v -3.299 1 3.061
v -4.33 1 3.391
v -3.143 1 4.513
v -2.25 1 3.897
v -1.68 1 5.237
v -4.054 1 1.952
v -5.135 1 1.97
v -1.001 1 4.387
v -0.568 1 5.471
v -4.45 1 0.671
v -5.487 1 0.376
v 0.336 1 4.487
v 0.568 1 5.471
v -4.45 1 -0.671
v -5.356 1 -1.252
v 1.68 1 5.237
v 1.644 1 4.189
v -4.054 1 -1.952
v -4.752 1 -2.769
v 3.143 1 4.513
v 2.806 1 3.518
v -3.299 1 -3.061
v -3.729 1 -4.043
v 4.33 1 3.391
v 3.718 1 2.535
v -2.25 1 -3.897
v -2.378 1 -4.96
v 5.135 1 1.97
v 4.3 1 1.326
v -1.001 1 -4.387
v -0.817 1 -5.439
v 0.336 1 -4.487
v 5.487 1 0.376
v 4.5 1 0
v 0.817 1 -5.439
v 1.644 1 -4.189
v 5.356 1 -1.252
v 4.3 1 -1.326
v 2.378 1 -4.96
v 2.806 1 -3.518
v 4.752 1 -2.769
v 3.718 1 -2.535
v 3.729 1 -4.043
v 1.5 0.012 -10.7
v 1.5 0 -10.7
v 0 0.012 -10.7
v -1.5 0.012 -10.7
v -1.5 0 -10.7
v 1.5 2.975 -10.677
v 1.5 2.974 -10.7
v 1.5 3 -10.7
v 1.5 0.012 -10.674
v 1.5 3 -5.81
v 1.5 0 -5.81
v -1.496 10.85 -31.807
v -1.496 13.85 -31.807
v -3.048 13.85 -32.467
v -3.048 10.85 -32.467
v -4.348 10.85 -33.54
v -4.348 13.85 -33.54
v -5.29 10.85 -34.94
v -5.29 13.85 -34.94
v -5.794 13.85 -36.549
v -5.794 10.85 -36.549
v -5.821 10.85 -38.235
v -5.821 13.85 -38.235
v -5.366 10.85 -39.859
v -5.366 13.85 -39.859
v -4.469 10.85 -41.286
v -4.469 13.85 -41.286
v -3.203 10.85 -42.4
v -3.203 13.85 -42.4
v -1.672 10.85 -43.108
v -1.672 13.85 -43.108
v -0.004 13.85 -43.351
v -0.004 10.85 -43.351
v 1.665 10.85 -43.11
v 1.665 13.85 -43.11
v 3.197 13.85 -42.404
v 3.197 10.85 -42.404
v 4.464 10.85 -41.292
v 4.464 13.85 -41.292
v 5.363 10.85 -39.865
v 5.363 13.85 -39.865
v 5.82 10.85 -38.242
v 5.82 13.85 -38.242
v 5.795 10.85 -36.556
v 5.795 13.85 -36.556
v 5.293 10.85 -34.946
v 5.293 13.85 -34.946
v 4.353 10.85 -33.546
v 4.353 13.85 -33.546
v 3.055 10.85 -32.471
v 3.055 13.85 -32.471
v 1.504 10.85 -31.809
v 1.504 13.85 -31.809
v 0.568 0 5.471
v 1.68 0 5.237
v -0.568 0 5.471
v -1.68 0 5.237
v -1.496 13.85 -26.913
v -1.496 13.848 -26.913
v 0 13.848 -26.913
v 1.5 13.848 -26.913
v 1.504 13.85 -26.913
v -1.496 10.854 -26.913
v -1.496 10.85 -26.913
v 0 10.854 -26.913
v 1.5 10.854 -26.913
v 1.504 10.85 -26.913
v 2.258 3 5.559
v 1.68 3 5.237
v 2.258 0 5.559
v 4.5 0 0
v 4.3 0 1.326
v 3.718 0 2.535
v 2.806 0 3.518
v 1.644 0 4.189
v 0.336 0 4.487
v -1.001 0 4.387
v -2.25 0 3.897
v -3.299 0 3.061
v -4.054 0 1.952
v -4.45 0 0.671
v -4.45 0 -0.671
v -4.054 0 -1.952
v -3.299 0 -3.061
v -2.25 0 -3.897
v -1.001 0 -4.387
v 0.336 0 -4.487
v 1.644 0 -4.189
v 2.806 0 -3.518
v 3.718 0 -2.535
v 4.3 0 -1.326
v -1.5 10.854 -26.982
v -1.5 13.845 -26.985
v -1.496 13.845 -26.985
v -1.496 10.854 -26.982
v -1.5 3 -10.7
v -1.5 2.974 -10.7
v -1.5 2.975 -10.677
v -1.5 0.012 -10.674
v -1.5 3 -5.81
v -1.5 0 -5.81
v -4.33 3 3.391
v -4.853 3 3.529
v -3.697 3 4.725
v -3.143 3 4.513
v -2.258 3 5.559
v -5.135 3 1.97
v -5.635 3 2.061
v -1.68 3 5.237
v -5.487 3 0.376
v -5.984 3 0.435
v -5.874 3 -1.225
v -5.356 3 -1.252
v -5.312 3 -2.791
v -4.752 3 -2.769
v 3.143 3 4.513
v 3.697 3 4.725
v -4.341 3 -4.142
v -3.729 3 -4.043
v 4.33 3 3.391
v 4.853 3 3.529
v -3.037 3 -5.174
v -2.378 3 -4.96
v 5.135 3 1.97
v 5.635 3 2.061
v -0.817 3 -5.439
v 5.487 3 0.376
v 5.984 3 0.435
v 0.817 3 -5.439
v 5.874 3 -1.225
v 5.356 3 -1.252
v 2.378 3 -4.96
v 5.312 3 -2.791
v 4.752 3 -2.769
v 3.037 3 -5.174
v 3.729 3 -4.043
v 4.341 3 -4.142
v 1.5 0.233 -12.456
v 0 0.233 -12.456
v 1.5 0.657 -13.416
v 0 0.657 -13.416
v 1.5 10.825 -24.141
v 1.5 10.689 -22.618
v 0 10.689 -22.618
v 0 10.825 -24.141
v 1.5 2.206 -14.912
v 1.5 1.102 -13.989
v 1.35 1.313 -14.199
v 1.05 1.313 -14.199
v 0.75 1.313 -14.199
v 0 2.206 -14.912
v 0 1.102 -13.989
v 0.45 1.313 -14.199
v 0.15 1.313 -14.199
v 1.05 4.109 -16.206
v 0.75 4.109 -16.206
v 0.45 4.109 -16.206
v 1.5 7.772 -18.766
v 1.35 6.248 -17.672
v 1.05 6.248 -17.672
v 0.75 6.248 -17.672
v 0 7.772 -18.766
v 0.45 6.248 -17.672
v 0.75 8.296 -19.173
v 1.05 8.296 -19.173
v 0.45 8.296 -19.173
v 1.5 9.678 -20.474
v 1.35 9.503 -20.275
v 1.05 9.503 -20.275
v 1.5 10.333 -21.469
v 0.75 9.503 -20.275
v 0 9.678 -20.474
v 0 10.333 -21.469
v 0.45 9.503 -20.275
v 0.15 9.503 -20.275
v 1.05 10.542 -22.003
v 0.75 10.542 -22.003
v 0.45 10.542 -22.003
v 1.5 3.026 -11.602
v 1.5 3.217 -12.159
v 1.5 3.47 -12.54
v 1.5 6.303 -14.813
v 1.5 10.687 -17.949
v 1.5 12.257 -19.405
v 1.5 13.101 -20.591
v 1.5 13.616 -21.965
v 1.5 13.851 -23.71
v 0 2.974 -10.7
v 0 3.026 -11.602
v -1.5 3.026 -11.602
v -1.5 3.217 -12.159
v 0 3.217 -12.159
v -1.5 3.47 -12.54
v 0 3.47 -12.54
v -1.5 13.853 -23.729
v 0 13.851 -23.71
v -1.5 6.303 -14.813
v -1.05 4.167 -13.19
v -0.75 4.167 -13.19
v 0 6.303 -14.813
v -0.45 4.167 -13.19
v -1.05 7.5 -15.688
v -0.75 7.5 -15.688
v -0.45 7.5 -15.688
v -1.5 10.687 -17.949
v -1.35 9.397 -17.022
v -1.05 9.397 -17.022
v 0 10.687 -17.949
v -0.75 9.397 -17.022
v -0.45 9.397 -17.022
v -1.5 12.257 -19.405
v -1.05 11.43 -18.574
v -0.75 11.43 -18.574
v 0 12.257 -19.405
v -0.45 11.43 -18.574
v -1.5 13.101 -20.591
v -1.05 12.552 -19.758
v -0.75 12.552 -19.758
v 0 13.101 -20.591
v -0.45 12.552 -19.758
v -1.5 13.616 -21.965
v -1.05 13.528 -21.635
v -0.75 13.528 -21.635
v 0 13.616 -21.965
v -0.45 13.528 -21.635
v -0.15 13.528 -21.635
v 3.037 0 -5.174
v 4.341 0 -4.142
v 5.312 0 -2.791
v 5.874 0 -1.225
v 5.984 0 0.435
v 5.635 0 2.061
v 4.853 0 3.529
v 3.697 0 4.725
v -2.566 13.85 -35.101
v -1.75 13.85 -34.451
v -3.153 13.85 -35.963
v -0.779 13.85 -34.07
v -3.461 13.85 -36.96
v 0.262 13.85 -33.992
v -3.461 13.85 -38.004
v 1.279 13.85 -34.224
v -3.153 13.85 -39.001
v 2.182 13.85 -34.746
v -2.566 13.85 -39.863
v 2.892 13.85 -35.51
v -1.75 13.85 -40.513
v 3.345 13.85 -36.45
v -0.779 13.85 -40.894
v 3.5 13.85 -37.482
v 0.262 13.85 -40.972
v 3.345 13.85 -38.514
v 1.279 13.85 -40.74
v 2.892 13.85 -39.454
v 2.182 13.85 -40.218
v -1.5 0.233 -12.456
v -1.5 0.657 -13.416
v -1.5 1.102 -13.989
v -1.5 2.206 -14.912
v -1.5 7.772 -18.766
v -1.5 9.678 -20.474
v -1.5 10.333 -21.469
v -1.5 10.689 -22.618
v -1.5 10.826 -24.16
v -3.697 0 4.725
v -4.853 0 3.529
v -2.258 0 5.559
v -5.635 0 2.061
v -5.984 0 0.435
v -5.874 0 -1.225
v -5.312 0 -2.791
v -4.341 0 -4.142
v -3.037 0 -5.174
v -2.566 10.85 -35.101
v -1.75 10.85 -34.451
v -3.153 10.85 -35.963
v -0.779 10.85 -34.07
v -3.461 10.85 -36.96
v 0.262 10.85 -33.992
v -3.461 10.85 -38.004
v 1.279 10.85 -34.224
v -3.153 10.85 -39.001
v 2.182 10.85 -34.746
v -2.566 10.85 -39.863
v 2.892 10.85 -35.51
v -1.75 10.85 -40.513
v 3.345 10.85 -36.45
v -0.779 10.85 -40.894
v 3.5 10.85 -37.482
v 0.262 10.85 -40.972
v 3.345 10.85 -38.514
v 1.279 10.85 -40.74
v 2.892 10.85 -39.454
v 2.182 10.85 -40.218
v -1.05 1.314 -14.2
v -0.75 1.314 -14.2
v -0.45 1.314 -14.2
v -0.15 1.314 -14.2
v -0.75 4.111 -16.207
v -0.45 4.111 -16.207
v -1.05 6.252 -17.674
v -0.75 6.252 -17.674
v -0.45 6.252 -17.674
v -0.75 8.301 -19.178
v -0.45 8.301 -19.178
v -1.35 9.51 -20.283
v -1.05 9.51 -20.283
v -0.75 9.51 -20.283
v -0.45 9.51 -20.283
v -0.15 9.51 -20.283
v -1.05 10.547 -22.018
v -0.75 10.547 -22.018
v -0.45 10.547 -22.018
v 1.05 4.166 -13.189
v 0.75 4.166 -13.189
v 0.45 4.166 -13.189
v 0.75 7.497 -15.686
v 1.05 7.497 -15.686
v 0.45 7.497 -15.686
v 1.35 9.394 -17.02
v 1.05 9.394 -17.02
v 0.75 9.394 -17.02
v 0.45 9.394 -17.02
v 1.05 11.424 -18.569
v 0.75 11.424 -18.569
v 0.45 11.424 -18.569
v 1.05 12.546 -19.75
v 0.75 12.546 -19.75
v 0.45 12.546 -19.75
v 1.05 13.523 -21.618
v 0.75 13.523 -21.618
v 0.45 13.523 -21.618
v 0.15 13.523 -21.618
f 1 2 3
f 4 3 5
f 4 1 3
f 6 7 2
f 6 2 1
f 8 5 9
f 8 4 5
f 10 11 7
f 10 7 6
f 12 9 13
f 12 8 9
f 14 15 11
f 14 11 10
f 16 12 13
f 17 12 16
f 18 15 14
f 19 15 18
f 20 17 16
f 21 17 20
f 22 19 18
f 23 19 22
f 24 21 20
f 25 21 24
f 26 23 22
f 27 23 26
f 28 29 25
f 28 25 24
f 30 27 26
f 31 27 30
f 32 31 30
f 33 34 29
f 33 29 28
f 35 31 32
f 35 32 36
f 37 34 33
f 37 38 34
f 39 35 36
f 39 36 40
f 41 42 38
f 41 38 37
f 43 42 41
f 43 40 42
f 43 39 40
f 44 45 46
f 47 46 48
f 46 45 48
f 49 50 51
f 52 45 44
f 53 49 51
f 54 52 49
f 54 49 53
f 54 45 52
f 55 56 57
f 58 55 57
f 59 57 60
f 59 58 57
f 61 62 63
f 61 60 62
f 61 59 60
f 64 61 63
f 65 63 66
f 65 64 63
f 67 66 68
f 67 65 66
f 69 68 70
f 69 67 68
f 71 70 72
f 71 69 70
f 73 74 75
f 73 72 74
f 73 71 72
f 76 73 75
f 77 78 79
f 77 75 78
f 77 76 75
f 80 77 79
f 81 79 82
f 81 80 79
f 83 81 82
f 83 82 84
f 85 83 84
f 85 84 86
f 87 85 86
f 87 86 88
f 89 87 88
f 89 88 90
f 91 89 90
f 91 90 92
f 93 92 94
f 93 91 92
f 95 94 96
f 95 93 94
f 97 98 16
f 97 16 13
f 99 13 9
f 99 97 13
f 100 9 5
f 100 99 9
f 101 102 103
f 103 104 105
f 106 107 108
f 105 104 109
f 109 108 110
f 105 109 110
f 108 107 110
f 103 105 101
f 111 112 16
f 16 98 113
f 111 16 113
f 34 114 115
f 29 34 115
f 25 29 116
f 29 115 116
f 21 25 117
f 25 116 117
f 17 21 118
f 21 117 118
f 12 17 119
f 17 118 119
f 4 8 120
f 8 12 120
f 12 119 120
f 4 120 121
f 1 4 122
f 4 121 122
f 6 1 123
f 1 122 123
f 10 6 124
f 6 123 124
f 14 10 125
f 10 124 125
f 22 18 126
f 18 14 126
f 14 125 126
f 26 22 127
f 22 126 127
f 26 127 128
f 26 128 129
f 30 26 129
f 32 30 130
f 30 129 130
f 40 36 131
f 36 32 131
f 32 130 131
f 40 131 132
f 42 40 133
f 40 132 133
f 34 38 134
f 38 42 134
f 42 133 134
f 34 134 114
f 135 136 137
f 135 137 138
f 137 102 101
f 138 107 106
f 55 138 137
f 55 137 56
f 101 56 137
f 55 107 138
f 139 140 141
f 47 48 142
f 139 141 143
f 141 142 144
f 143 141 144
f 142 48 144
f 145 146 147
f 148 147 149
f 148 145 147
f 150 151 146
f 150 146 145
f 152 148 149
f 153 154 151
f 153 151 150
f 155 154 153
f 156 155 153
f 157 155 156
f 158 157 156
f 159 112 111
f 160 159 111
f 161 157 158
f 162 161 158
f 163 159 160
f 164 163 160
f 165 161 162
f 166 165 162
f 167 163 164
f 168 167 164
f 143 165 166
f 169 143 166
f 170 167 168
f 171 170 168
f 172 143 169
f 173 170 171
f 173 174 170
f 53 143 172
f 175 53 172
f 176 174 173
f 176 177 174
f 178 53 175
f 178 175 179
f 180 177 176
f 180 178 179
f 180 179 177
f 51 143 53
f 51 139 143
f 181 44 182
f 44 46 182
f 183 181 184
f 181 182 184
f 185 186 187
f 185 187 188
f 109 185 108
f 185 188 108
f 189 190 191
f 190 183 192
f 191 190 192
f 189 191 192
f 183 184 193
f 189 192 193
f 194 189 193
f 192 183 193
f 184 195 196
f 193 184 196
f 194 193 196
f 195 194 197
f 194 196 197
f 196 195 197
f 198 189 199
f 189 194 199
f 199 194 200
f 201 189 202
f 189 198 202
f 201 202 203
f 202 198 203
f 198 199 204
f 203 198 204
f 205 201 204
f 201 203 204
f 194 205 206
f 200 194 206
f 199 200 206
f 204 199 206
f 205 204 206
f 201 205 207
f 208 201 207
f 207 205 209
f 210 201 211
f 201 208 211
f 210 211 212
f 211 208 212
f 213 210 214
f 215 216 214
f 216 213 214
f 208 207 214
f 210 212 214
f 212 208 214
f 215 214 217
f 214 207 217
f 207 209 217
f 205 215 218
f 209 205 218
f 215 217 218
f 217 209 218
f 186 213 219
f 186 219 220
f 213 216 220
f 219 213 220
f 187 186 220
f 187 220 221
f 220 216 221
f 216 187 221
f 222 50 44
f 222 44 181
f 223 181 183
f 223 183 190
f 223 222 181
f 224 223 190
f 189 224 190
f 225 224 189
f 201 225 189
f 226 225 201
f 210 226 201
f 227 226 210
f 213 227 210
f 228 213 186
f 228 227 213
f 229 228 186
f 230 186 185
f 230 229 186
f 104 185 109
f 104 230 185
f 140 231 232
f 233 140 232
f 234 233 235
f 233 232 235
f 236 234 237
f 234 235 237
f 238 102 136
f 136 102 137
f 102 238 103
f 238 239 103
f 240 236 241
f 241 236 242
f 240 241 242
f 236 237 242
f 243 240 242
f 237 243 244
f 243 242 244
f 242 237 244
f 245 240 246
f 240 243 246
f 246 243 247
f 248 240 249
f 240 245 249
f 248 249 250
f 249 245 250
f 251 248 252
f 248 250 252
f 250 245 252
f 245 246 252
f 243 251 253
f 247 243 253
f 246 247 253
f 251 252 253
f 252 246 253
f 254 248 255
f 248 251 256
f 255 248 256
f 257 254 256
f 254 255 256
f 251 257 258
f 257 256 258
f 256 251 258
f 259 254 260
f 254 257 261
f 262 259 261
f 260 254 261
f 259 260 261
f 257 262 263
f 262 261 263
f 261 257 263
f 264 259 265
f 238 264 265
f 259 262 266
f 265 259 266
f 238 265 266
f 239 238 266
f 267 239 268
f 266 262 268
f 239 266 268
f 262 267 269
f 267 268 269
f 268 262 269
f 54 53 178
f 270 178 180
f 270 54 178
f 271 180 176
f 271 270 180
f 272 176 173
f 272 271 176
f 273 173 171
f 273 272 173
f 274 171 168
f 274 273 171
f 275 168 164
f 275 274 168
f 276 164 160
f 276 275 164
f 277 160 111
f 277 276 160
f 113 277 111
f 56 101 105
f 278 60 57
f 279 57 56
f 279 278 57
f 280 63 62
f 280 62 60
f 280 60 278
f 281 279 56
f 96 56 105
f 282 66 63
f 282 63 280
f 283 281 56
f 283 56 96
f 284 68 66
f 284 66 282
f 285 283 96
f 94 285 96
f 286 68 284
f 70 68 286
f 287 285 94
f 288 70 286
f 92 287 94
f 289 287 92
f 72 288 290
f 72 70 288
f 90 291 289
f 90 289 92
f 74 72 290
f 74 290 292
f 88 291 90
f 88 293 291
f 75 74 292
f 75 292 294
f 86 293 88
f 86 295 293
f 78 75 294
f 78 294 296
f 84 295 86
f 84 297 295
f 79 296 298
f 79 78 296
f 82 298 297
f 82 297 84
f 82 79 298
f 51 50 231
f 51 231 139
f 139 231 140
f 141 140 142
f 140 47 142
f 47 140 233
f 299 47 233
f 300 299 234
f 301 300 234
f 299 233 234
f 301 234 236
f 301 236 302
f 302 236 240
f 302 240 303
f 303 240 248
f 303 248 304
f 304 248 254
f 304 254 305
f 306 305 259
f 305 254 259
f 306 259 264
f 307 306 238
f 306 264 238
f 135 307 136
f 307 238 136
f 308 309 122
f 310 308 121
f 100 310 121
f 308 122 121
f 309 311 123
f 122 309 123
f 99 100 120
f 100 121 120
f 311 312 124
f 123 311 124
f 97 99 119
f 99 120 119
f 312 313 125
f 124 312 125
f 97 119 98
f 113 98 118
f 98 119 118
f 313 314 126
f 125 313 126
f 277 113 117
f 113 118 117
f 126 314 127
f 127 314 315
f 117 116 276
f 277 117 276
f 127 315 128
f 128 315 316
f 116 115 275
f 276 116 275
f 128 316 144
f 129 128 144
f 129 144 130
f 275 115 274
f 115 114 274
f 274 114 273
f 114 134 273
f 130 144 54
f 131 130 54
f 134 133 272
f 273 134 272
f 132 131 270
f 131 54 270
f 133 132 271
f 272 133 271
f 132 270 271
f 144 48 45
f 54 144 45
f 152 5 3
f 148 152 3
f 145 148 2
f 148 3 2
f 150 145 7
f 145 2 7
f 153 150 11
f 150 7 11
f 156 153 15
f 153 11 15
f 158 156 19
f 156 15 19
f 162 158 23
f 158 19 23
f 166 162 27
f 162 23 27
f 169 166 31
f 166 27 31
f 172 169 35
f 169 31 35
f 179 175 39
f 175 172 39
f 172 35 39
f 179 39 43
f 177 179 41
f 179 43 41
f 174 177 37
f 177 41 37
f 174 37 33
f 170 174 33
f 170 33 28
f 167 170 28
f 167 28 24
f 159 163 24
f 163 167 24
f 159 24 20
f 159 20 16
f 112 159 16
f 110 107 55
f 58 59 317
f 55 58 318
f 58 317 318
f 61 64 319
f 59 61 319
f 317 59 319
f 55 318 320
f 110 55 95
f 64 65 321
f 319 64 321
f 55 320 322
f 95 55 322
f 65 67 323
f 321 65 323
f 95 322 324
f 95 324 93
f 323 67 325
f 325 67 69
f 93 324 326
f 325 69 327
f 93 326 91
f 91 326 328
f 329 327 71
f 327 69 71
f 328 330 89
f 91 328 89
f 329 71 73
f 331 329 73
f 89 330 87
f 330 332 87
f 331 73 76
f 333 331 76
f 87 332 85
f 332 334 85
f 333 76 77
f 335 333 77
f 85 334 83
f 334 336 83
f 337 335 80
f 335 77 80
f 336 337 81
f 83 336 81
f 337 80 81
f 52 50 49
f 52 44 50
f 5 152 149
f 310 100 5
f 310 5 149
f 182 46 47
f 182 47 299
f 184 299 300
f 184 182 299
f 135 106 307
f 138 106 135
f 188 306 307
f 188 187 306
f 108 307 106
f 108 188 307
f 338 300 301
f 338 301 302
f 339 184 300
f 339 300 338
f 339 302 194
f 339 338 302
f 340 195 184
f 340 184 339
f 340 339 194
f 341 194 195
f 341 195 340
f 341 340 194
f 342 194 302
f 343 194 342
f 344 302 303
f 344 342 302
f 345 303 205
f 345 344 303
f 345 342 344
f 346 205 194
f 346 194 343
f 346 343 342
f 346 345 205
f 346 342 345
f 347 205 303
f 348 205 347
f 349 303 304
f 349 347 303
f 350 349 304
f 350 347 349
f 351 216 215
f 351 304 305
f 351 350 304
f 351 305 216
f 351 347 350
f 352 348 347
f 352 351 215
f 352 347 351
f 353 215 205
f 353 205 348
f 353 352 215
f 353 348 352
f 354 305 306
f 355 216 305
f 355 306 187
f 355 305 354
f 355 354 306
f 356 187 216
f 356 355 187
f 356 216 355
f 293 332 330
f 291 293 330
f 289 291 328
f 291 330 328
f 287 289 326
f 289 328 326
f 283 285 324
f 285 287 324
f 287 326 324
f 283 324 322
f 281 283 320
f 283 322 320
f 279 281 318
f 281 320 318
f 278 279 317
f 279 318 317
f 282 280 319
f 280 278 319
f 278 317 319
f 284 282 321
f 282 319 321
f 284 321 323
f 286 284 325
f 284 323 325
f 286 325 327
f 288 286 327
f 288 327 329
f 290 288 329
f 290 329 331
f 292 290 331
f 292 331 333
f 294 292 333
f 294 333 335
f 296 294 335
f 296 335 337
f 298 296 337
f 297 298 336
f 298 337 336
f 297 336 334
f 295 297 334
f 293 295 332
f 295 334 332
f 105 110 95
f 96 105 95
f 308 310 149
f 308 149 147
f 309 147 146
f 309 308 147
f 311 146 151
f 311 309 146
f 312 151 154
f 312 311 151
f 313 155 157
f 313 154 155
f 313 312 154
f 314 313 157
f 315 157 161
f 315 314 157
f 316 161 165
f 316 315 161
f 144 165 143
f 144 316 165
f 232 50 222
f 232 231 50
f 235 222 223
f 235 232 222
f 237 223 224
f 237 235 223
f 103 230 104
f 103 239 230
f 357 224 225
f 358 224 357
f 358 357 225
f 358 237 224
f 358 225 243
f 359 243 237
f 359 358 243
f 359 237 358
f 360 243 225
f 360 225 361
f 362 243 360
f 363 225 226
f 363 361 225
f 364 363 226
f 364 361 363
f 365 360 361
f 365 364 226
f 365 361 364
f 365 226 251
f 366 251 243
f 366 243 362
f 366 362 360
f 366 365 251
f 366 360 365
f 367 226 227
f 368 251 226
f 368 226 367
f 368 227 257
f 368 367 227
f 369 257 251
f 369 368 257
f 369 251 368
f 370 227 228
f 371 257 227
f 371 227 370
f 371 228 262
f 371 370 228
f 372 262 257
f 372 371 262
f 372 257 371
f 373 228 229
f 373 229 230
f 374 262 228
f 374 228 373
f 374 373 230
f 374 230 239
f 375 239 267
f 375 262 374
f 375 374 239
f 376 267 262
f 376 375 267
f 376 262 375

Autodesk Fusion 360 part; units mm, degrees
sketch "Counter holder" plane through (0, 0, 0) normal (0, 1, 0) x (1, 0, 0)
  line L0 (1.6795, -5.2373) -> (2.2579, -5.559)
  circle A0 centre (0, 0) radius 4.5
  line L1 (-1.6795, -5.2373) -> (-2.2579, -5.559)
  circle A1 centre (0, 0) radius 5.5
  arc A2 (2.2579, -5.559) -> (-1.5, 5.8095) centre (0, 0) ccw
  line L2 (0, 10.7) -> (-1.5, 10.7)
  line L3 (0, 10.7) -> (1.5, 10.7)
  arc A3 (-1.5, 5.8095) -> (-2.2579, -5.559) centre (0, 0) ccw
  line L4 (1.5, 10.7) -> (1.5, 5.8095)
  line L5 (-1.5, 10.7) -> (-1.5, 5.8095)
  point P0 (2.6505, 5.3709)
  dimension "d2" = 11
  dimension "d3" = 9
  dimension "d25" = 12
  dimension "d28" = 1.5
  dimension "d29" = 1.5
ref_plane "WorkPlane1" through (0, 10.85, 0) normal (0, 1, 0) x (1, 0, 0)
sketch "Servo holder" plane through (0, 10.85, 0) normal (0, 1, 0) x (1, 0, 0)
  circle A0 centre (0, 37.482) radius 3.5
  line L0 (0.0036, 26.913) -> (-1.4964, 26.913)
  line L1 (-1.4964, 26.913) -> (0.0036, 26.913)
  line L2 (0.0036, 26.913) -> (1.5036, 26.913)
  line L3 (1.5036, 26.913) -> (1.5036, 31.8089)
  line L4 (-1.4964, 26.913) -> (-1.4964, 31.807)
  arc A1 (-1.4964, 31.807) -> (1.5036, 31.8089) centre (0, 37.482) ccw
  arc A2 (1.5036, 31.8089) -> (-1.4964, 31.807) centre (0, 37.482) ccw
  point P0 (2.4711, 32.1586)
  point P1 (-2.4665, 32.1565)
  dimension "d6" = 11.738
  dimension "d7" = 7
  dimension "d31" = 1.5
  dimension "d32" = 1.5
extrude "Extrude4" add sketch "Counter holder" along normal blind 1 contours A1 makes body 1
extrude "Extrude5" add sketch "Counter holder" along normal blind 3 contours L0 L1 A1 A2 A3 bodies 1
extrude "Extrude6" add sketch "Counter holder" along normal blind 3 contours A2 L2 L3 L4 L5 bodies 1
extrude "Extrude7" add sketch "Servo holder" along normal blind 3 separate body contours A1 A2 makes body 2
extrude "Extrude8" add sketch "Servo holder" along normal blind 3 contours L0 L1 L2 L3 L4 A1 bodies 2
sketch "Connection" plane through (0, 0, 0) normal (1, 0, 0) x (0, 0, -1)
  line L0 (10.6742, 0.0115) -> (13.0212, 0.009) construction
  line L1 (13.0212, 0.009) -> (14.5207, 1.4657) construction
  line L2 (14.5207, 1.4657) -> (15.3617, 2.9367) construction
  line L3 (15.3617, 2.9367) -> (16.5492, 4.5723) construction
  line L4 (16.5492, 4.5723) -> (17.7004, 6.3241) construction
  line L5 (17.7004, 6.3241) -> (18.7215, 7.7387) construction
  line L6 (18.7215, 7.7387) -> (20.0559, 9.518) construction
  line L7 (20.0559, 9.518) -> (21.6526, 10.8269) construction
  line L8 (21.6526, 10.8269) -> (23.6966, 10.8532) construction
  line L9 (23.6966, 10.8532) -> (26.9817, 10.8544) construction
  spline S0 degree 5 poles (10.6742, 0.0115) (13.0212, 0.009) (14.5207, 1.4657) (15.3617, 2.9367) (16.5492, 4.5723) (17.7004, 6.3241) (18.7215, 7.7387) (20.0559, 9.518) (21.6526, 10.8269) (23.6966, 10.8532) (26.9817, 10.8544) knots 0 0 0 0 0 0 0.166667 0.333333 0.5 0.666667 0.833333 1 1 1 1 1 1
  spline S1 degree 5 poles (10.6774, 2.9747) (12.3316, 2.8904) (12.9969, 4.0027) (15.0793, 6.5355) (15.9956, 8.0056) (17.0271, 9.3169) (17.9968, 10.9661) (19.6323, 12.6073) (21.0727, 13.6625) (23.6453, 13.9834) (26.9849, 13.8452) knots 0 0 0 0 0 0 0.166667 0.333333 0.5 0.666667 0.833333 1 1 1 1 1 1
  line L10 (10.6774, 2.9747) -> (12.3316, 2.8904) construction
  line L11 (12.3316, 2.8904) -> (12.9969, 4.0027) construction
  line L12 (12.9969, 4.0027) -> (15.0793, 6.5355) construction
  line L13 (15.0793, 6.5355) -> (15.9956, 8.0056) construction
  line L14 (15.9956, 8.0056) -> (17.0271, 9.3169) construction
  line L15 (17.0271, 9.3169) -> (17.9968, 10.9661) construction
  line L16 (17.9968, 10.9661) -> (19.6323, 12.6073) construction
  line L17 (19.6323, 12.6073) -> (21.0727, 13.6625) construction
  line L18 (21.0727, 13.6625) -> (23.6453, 13.9834) construction
  line L19 (23.6453, 13.9834) -> (26.9849, 13.8452) construction
  line L20 (10.6774, 2.9747) -> (10.6742, 0.0115)
  line L21 (26.9849, 13.8452) -> (26.9817, 10.8544)
extrude "Extrude9" add sketch "Connection" along normal mid plane 3 bodies 1 2
